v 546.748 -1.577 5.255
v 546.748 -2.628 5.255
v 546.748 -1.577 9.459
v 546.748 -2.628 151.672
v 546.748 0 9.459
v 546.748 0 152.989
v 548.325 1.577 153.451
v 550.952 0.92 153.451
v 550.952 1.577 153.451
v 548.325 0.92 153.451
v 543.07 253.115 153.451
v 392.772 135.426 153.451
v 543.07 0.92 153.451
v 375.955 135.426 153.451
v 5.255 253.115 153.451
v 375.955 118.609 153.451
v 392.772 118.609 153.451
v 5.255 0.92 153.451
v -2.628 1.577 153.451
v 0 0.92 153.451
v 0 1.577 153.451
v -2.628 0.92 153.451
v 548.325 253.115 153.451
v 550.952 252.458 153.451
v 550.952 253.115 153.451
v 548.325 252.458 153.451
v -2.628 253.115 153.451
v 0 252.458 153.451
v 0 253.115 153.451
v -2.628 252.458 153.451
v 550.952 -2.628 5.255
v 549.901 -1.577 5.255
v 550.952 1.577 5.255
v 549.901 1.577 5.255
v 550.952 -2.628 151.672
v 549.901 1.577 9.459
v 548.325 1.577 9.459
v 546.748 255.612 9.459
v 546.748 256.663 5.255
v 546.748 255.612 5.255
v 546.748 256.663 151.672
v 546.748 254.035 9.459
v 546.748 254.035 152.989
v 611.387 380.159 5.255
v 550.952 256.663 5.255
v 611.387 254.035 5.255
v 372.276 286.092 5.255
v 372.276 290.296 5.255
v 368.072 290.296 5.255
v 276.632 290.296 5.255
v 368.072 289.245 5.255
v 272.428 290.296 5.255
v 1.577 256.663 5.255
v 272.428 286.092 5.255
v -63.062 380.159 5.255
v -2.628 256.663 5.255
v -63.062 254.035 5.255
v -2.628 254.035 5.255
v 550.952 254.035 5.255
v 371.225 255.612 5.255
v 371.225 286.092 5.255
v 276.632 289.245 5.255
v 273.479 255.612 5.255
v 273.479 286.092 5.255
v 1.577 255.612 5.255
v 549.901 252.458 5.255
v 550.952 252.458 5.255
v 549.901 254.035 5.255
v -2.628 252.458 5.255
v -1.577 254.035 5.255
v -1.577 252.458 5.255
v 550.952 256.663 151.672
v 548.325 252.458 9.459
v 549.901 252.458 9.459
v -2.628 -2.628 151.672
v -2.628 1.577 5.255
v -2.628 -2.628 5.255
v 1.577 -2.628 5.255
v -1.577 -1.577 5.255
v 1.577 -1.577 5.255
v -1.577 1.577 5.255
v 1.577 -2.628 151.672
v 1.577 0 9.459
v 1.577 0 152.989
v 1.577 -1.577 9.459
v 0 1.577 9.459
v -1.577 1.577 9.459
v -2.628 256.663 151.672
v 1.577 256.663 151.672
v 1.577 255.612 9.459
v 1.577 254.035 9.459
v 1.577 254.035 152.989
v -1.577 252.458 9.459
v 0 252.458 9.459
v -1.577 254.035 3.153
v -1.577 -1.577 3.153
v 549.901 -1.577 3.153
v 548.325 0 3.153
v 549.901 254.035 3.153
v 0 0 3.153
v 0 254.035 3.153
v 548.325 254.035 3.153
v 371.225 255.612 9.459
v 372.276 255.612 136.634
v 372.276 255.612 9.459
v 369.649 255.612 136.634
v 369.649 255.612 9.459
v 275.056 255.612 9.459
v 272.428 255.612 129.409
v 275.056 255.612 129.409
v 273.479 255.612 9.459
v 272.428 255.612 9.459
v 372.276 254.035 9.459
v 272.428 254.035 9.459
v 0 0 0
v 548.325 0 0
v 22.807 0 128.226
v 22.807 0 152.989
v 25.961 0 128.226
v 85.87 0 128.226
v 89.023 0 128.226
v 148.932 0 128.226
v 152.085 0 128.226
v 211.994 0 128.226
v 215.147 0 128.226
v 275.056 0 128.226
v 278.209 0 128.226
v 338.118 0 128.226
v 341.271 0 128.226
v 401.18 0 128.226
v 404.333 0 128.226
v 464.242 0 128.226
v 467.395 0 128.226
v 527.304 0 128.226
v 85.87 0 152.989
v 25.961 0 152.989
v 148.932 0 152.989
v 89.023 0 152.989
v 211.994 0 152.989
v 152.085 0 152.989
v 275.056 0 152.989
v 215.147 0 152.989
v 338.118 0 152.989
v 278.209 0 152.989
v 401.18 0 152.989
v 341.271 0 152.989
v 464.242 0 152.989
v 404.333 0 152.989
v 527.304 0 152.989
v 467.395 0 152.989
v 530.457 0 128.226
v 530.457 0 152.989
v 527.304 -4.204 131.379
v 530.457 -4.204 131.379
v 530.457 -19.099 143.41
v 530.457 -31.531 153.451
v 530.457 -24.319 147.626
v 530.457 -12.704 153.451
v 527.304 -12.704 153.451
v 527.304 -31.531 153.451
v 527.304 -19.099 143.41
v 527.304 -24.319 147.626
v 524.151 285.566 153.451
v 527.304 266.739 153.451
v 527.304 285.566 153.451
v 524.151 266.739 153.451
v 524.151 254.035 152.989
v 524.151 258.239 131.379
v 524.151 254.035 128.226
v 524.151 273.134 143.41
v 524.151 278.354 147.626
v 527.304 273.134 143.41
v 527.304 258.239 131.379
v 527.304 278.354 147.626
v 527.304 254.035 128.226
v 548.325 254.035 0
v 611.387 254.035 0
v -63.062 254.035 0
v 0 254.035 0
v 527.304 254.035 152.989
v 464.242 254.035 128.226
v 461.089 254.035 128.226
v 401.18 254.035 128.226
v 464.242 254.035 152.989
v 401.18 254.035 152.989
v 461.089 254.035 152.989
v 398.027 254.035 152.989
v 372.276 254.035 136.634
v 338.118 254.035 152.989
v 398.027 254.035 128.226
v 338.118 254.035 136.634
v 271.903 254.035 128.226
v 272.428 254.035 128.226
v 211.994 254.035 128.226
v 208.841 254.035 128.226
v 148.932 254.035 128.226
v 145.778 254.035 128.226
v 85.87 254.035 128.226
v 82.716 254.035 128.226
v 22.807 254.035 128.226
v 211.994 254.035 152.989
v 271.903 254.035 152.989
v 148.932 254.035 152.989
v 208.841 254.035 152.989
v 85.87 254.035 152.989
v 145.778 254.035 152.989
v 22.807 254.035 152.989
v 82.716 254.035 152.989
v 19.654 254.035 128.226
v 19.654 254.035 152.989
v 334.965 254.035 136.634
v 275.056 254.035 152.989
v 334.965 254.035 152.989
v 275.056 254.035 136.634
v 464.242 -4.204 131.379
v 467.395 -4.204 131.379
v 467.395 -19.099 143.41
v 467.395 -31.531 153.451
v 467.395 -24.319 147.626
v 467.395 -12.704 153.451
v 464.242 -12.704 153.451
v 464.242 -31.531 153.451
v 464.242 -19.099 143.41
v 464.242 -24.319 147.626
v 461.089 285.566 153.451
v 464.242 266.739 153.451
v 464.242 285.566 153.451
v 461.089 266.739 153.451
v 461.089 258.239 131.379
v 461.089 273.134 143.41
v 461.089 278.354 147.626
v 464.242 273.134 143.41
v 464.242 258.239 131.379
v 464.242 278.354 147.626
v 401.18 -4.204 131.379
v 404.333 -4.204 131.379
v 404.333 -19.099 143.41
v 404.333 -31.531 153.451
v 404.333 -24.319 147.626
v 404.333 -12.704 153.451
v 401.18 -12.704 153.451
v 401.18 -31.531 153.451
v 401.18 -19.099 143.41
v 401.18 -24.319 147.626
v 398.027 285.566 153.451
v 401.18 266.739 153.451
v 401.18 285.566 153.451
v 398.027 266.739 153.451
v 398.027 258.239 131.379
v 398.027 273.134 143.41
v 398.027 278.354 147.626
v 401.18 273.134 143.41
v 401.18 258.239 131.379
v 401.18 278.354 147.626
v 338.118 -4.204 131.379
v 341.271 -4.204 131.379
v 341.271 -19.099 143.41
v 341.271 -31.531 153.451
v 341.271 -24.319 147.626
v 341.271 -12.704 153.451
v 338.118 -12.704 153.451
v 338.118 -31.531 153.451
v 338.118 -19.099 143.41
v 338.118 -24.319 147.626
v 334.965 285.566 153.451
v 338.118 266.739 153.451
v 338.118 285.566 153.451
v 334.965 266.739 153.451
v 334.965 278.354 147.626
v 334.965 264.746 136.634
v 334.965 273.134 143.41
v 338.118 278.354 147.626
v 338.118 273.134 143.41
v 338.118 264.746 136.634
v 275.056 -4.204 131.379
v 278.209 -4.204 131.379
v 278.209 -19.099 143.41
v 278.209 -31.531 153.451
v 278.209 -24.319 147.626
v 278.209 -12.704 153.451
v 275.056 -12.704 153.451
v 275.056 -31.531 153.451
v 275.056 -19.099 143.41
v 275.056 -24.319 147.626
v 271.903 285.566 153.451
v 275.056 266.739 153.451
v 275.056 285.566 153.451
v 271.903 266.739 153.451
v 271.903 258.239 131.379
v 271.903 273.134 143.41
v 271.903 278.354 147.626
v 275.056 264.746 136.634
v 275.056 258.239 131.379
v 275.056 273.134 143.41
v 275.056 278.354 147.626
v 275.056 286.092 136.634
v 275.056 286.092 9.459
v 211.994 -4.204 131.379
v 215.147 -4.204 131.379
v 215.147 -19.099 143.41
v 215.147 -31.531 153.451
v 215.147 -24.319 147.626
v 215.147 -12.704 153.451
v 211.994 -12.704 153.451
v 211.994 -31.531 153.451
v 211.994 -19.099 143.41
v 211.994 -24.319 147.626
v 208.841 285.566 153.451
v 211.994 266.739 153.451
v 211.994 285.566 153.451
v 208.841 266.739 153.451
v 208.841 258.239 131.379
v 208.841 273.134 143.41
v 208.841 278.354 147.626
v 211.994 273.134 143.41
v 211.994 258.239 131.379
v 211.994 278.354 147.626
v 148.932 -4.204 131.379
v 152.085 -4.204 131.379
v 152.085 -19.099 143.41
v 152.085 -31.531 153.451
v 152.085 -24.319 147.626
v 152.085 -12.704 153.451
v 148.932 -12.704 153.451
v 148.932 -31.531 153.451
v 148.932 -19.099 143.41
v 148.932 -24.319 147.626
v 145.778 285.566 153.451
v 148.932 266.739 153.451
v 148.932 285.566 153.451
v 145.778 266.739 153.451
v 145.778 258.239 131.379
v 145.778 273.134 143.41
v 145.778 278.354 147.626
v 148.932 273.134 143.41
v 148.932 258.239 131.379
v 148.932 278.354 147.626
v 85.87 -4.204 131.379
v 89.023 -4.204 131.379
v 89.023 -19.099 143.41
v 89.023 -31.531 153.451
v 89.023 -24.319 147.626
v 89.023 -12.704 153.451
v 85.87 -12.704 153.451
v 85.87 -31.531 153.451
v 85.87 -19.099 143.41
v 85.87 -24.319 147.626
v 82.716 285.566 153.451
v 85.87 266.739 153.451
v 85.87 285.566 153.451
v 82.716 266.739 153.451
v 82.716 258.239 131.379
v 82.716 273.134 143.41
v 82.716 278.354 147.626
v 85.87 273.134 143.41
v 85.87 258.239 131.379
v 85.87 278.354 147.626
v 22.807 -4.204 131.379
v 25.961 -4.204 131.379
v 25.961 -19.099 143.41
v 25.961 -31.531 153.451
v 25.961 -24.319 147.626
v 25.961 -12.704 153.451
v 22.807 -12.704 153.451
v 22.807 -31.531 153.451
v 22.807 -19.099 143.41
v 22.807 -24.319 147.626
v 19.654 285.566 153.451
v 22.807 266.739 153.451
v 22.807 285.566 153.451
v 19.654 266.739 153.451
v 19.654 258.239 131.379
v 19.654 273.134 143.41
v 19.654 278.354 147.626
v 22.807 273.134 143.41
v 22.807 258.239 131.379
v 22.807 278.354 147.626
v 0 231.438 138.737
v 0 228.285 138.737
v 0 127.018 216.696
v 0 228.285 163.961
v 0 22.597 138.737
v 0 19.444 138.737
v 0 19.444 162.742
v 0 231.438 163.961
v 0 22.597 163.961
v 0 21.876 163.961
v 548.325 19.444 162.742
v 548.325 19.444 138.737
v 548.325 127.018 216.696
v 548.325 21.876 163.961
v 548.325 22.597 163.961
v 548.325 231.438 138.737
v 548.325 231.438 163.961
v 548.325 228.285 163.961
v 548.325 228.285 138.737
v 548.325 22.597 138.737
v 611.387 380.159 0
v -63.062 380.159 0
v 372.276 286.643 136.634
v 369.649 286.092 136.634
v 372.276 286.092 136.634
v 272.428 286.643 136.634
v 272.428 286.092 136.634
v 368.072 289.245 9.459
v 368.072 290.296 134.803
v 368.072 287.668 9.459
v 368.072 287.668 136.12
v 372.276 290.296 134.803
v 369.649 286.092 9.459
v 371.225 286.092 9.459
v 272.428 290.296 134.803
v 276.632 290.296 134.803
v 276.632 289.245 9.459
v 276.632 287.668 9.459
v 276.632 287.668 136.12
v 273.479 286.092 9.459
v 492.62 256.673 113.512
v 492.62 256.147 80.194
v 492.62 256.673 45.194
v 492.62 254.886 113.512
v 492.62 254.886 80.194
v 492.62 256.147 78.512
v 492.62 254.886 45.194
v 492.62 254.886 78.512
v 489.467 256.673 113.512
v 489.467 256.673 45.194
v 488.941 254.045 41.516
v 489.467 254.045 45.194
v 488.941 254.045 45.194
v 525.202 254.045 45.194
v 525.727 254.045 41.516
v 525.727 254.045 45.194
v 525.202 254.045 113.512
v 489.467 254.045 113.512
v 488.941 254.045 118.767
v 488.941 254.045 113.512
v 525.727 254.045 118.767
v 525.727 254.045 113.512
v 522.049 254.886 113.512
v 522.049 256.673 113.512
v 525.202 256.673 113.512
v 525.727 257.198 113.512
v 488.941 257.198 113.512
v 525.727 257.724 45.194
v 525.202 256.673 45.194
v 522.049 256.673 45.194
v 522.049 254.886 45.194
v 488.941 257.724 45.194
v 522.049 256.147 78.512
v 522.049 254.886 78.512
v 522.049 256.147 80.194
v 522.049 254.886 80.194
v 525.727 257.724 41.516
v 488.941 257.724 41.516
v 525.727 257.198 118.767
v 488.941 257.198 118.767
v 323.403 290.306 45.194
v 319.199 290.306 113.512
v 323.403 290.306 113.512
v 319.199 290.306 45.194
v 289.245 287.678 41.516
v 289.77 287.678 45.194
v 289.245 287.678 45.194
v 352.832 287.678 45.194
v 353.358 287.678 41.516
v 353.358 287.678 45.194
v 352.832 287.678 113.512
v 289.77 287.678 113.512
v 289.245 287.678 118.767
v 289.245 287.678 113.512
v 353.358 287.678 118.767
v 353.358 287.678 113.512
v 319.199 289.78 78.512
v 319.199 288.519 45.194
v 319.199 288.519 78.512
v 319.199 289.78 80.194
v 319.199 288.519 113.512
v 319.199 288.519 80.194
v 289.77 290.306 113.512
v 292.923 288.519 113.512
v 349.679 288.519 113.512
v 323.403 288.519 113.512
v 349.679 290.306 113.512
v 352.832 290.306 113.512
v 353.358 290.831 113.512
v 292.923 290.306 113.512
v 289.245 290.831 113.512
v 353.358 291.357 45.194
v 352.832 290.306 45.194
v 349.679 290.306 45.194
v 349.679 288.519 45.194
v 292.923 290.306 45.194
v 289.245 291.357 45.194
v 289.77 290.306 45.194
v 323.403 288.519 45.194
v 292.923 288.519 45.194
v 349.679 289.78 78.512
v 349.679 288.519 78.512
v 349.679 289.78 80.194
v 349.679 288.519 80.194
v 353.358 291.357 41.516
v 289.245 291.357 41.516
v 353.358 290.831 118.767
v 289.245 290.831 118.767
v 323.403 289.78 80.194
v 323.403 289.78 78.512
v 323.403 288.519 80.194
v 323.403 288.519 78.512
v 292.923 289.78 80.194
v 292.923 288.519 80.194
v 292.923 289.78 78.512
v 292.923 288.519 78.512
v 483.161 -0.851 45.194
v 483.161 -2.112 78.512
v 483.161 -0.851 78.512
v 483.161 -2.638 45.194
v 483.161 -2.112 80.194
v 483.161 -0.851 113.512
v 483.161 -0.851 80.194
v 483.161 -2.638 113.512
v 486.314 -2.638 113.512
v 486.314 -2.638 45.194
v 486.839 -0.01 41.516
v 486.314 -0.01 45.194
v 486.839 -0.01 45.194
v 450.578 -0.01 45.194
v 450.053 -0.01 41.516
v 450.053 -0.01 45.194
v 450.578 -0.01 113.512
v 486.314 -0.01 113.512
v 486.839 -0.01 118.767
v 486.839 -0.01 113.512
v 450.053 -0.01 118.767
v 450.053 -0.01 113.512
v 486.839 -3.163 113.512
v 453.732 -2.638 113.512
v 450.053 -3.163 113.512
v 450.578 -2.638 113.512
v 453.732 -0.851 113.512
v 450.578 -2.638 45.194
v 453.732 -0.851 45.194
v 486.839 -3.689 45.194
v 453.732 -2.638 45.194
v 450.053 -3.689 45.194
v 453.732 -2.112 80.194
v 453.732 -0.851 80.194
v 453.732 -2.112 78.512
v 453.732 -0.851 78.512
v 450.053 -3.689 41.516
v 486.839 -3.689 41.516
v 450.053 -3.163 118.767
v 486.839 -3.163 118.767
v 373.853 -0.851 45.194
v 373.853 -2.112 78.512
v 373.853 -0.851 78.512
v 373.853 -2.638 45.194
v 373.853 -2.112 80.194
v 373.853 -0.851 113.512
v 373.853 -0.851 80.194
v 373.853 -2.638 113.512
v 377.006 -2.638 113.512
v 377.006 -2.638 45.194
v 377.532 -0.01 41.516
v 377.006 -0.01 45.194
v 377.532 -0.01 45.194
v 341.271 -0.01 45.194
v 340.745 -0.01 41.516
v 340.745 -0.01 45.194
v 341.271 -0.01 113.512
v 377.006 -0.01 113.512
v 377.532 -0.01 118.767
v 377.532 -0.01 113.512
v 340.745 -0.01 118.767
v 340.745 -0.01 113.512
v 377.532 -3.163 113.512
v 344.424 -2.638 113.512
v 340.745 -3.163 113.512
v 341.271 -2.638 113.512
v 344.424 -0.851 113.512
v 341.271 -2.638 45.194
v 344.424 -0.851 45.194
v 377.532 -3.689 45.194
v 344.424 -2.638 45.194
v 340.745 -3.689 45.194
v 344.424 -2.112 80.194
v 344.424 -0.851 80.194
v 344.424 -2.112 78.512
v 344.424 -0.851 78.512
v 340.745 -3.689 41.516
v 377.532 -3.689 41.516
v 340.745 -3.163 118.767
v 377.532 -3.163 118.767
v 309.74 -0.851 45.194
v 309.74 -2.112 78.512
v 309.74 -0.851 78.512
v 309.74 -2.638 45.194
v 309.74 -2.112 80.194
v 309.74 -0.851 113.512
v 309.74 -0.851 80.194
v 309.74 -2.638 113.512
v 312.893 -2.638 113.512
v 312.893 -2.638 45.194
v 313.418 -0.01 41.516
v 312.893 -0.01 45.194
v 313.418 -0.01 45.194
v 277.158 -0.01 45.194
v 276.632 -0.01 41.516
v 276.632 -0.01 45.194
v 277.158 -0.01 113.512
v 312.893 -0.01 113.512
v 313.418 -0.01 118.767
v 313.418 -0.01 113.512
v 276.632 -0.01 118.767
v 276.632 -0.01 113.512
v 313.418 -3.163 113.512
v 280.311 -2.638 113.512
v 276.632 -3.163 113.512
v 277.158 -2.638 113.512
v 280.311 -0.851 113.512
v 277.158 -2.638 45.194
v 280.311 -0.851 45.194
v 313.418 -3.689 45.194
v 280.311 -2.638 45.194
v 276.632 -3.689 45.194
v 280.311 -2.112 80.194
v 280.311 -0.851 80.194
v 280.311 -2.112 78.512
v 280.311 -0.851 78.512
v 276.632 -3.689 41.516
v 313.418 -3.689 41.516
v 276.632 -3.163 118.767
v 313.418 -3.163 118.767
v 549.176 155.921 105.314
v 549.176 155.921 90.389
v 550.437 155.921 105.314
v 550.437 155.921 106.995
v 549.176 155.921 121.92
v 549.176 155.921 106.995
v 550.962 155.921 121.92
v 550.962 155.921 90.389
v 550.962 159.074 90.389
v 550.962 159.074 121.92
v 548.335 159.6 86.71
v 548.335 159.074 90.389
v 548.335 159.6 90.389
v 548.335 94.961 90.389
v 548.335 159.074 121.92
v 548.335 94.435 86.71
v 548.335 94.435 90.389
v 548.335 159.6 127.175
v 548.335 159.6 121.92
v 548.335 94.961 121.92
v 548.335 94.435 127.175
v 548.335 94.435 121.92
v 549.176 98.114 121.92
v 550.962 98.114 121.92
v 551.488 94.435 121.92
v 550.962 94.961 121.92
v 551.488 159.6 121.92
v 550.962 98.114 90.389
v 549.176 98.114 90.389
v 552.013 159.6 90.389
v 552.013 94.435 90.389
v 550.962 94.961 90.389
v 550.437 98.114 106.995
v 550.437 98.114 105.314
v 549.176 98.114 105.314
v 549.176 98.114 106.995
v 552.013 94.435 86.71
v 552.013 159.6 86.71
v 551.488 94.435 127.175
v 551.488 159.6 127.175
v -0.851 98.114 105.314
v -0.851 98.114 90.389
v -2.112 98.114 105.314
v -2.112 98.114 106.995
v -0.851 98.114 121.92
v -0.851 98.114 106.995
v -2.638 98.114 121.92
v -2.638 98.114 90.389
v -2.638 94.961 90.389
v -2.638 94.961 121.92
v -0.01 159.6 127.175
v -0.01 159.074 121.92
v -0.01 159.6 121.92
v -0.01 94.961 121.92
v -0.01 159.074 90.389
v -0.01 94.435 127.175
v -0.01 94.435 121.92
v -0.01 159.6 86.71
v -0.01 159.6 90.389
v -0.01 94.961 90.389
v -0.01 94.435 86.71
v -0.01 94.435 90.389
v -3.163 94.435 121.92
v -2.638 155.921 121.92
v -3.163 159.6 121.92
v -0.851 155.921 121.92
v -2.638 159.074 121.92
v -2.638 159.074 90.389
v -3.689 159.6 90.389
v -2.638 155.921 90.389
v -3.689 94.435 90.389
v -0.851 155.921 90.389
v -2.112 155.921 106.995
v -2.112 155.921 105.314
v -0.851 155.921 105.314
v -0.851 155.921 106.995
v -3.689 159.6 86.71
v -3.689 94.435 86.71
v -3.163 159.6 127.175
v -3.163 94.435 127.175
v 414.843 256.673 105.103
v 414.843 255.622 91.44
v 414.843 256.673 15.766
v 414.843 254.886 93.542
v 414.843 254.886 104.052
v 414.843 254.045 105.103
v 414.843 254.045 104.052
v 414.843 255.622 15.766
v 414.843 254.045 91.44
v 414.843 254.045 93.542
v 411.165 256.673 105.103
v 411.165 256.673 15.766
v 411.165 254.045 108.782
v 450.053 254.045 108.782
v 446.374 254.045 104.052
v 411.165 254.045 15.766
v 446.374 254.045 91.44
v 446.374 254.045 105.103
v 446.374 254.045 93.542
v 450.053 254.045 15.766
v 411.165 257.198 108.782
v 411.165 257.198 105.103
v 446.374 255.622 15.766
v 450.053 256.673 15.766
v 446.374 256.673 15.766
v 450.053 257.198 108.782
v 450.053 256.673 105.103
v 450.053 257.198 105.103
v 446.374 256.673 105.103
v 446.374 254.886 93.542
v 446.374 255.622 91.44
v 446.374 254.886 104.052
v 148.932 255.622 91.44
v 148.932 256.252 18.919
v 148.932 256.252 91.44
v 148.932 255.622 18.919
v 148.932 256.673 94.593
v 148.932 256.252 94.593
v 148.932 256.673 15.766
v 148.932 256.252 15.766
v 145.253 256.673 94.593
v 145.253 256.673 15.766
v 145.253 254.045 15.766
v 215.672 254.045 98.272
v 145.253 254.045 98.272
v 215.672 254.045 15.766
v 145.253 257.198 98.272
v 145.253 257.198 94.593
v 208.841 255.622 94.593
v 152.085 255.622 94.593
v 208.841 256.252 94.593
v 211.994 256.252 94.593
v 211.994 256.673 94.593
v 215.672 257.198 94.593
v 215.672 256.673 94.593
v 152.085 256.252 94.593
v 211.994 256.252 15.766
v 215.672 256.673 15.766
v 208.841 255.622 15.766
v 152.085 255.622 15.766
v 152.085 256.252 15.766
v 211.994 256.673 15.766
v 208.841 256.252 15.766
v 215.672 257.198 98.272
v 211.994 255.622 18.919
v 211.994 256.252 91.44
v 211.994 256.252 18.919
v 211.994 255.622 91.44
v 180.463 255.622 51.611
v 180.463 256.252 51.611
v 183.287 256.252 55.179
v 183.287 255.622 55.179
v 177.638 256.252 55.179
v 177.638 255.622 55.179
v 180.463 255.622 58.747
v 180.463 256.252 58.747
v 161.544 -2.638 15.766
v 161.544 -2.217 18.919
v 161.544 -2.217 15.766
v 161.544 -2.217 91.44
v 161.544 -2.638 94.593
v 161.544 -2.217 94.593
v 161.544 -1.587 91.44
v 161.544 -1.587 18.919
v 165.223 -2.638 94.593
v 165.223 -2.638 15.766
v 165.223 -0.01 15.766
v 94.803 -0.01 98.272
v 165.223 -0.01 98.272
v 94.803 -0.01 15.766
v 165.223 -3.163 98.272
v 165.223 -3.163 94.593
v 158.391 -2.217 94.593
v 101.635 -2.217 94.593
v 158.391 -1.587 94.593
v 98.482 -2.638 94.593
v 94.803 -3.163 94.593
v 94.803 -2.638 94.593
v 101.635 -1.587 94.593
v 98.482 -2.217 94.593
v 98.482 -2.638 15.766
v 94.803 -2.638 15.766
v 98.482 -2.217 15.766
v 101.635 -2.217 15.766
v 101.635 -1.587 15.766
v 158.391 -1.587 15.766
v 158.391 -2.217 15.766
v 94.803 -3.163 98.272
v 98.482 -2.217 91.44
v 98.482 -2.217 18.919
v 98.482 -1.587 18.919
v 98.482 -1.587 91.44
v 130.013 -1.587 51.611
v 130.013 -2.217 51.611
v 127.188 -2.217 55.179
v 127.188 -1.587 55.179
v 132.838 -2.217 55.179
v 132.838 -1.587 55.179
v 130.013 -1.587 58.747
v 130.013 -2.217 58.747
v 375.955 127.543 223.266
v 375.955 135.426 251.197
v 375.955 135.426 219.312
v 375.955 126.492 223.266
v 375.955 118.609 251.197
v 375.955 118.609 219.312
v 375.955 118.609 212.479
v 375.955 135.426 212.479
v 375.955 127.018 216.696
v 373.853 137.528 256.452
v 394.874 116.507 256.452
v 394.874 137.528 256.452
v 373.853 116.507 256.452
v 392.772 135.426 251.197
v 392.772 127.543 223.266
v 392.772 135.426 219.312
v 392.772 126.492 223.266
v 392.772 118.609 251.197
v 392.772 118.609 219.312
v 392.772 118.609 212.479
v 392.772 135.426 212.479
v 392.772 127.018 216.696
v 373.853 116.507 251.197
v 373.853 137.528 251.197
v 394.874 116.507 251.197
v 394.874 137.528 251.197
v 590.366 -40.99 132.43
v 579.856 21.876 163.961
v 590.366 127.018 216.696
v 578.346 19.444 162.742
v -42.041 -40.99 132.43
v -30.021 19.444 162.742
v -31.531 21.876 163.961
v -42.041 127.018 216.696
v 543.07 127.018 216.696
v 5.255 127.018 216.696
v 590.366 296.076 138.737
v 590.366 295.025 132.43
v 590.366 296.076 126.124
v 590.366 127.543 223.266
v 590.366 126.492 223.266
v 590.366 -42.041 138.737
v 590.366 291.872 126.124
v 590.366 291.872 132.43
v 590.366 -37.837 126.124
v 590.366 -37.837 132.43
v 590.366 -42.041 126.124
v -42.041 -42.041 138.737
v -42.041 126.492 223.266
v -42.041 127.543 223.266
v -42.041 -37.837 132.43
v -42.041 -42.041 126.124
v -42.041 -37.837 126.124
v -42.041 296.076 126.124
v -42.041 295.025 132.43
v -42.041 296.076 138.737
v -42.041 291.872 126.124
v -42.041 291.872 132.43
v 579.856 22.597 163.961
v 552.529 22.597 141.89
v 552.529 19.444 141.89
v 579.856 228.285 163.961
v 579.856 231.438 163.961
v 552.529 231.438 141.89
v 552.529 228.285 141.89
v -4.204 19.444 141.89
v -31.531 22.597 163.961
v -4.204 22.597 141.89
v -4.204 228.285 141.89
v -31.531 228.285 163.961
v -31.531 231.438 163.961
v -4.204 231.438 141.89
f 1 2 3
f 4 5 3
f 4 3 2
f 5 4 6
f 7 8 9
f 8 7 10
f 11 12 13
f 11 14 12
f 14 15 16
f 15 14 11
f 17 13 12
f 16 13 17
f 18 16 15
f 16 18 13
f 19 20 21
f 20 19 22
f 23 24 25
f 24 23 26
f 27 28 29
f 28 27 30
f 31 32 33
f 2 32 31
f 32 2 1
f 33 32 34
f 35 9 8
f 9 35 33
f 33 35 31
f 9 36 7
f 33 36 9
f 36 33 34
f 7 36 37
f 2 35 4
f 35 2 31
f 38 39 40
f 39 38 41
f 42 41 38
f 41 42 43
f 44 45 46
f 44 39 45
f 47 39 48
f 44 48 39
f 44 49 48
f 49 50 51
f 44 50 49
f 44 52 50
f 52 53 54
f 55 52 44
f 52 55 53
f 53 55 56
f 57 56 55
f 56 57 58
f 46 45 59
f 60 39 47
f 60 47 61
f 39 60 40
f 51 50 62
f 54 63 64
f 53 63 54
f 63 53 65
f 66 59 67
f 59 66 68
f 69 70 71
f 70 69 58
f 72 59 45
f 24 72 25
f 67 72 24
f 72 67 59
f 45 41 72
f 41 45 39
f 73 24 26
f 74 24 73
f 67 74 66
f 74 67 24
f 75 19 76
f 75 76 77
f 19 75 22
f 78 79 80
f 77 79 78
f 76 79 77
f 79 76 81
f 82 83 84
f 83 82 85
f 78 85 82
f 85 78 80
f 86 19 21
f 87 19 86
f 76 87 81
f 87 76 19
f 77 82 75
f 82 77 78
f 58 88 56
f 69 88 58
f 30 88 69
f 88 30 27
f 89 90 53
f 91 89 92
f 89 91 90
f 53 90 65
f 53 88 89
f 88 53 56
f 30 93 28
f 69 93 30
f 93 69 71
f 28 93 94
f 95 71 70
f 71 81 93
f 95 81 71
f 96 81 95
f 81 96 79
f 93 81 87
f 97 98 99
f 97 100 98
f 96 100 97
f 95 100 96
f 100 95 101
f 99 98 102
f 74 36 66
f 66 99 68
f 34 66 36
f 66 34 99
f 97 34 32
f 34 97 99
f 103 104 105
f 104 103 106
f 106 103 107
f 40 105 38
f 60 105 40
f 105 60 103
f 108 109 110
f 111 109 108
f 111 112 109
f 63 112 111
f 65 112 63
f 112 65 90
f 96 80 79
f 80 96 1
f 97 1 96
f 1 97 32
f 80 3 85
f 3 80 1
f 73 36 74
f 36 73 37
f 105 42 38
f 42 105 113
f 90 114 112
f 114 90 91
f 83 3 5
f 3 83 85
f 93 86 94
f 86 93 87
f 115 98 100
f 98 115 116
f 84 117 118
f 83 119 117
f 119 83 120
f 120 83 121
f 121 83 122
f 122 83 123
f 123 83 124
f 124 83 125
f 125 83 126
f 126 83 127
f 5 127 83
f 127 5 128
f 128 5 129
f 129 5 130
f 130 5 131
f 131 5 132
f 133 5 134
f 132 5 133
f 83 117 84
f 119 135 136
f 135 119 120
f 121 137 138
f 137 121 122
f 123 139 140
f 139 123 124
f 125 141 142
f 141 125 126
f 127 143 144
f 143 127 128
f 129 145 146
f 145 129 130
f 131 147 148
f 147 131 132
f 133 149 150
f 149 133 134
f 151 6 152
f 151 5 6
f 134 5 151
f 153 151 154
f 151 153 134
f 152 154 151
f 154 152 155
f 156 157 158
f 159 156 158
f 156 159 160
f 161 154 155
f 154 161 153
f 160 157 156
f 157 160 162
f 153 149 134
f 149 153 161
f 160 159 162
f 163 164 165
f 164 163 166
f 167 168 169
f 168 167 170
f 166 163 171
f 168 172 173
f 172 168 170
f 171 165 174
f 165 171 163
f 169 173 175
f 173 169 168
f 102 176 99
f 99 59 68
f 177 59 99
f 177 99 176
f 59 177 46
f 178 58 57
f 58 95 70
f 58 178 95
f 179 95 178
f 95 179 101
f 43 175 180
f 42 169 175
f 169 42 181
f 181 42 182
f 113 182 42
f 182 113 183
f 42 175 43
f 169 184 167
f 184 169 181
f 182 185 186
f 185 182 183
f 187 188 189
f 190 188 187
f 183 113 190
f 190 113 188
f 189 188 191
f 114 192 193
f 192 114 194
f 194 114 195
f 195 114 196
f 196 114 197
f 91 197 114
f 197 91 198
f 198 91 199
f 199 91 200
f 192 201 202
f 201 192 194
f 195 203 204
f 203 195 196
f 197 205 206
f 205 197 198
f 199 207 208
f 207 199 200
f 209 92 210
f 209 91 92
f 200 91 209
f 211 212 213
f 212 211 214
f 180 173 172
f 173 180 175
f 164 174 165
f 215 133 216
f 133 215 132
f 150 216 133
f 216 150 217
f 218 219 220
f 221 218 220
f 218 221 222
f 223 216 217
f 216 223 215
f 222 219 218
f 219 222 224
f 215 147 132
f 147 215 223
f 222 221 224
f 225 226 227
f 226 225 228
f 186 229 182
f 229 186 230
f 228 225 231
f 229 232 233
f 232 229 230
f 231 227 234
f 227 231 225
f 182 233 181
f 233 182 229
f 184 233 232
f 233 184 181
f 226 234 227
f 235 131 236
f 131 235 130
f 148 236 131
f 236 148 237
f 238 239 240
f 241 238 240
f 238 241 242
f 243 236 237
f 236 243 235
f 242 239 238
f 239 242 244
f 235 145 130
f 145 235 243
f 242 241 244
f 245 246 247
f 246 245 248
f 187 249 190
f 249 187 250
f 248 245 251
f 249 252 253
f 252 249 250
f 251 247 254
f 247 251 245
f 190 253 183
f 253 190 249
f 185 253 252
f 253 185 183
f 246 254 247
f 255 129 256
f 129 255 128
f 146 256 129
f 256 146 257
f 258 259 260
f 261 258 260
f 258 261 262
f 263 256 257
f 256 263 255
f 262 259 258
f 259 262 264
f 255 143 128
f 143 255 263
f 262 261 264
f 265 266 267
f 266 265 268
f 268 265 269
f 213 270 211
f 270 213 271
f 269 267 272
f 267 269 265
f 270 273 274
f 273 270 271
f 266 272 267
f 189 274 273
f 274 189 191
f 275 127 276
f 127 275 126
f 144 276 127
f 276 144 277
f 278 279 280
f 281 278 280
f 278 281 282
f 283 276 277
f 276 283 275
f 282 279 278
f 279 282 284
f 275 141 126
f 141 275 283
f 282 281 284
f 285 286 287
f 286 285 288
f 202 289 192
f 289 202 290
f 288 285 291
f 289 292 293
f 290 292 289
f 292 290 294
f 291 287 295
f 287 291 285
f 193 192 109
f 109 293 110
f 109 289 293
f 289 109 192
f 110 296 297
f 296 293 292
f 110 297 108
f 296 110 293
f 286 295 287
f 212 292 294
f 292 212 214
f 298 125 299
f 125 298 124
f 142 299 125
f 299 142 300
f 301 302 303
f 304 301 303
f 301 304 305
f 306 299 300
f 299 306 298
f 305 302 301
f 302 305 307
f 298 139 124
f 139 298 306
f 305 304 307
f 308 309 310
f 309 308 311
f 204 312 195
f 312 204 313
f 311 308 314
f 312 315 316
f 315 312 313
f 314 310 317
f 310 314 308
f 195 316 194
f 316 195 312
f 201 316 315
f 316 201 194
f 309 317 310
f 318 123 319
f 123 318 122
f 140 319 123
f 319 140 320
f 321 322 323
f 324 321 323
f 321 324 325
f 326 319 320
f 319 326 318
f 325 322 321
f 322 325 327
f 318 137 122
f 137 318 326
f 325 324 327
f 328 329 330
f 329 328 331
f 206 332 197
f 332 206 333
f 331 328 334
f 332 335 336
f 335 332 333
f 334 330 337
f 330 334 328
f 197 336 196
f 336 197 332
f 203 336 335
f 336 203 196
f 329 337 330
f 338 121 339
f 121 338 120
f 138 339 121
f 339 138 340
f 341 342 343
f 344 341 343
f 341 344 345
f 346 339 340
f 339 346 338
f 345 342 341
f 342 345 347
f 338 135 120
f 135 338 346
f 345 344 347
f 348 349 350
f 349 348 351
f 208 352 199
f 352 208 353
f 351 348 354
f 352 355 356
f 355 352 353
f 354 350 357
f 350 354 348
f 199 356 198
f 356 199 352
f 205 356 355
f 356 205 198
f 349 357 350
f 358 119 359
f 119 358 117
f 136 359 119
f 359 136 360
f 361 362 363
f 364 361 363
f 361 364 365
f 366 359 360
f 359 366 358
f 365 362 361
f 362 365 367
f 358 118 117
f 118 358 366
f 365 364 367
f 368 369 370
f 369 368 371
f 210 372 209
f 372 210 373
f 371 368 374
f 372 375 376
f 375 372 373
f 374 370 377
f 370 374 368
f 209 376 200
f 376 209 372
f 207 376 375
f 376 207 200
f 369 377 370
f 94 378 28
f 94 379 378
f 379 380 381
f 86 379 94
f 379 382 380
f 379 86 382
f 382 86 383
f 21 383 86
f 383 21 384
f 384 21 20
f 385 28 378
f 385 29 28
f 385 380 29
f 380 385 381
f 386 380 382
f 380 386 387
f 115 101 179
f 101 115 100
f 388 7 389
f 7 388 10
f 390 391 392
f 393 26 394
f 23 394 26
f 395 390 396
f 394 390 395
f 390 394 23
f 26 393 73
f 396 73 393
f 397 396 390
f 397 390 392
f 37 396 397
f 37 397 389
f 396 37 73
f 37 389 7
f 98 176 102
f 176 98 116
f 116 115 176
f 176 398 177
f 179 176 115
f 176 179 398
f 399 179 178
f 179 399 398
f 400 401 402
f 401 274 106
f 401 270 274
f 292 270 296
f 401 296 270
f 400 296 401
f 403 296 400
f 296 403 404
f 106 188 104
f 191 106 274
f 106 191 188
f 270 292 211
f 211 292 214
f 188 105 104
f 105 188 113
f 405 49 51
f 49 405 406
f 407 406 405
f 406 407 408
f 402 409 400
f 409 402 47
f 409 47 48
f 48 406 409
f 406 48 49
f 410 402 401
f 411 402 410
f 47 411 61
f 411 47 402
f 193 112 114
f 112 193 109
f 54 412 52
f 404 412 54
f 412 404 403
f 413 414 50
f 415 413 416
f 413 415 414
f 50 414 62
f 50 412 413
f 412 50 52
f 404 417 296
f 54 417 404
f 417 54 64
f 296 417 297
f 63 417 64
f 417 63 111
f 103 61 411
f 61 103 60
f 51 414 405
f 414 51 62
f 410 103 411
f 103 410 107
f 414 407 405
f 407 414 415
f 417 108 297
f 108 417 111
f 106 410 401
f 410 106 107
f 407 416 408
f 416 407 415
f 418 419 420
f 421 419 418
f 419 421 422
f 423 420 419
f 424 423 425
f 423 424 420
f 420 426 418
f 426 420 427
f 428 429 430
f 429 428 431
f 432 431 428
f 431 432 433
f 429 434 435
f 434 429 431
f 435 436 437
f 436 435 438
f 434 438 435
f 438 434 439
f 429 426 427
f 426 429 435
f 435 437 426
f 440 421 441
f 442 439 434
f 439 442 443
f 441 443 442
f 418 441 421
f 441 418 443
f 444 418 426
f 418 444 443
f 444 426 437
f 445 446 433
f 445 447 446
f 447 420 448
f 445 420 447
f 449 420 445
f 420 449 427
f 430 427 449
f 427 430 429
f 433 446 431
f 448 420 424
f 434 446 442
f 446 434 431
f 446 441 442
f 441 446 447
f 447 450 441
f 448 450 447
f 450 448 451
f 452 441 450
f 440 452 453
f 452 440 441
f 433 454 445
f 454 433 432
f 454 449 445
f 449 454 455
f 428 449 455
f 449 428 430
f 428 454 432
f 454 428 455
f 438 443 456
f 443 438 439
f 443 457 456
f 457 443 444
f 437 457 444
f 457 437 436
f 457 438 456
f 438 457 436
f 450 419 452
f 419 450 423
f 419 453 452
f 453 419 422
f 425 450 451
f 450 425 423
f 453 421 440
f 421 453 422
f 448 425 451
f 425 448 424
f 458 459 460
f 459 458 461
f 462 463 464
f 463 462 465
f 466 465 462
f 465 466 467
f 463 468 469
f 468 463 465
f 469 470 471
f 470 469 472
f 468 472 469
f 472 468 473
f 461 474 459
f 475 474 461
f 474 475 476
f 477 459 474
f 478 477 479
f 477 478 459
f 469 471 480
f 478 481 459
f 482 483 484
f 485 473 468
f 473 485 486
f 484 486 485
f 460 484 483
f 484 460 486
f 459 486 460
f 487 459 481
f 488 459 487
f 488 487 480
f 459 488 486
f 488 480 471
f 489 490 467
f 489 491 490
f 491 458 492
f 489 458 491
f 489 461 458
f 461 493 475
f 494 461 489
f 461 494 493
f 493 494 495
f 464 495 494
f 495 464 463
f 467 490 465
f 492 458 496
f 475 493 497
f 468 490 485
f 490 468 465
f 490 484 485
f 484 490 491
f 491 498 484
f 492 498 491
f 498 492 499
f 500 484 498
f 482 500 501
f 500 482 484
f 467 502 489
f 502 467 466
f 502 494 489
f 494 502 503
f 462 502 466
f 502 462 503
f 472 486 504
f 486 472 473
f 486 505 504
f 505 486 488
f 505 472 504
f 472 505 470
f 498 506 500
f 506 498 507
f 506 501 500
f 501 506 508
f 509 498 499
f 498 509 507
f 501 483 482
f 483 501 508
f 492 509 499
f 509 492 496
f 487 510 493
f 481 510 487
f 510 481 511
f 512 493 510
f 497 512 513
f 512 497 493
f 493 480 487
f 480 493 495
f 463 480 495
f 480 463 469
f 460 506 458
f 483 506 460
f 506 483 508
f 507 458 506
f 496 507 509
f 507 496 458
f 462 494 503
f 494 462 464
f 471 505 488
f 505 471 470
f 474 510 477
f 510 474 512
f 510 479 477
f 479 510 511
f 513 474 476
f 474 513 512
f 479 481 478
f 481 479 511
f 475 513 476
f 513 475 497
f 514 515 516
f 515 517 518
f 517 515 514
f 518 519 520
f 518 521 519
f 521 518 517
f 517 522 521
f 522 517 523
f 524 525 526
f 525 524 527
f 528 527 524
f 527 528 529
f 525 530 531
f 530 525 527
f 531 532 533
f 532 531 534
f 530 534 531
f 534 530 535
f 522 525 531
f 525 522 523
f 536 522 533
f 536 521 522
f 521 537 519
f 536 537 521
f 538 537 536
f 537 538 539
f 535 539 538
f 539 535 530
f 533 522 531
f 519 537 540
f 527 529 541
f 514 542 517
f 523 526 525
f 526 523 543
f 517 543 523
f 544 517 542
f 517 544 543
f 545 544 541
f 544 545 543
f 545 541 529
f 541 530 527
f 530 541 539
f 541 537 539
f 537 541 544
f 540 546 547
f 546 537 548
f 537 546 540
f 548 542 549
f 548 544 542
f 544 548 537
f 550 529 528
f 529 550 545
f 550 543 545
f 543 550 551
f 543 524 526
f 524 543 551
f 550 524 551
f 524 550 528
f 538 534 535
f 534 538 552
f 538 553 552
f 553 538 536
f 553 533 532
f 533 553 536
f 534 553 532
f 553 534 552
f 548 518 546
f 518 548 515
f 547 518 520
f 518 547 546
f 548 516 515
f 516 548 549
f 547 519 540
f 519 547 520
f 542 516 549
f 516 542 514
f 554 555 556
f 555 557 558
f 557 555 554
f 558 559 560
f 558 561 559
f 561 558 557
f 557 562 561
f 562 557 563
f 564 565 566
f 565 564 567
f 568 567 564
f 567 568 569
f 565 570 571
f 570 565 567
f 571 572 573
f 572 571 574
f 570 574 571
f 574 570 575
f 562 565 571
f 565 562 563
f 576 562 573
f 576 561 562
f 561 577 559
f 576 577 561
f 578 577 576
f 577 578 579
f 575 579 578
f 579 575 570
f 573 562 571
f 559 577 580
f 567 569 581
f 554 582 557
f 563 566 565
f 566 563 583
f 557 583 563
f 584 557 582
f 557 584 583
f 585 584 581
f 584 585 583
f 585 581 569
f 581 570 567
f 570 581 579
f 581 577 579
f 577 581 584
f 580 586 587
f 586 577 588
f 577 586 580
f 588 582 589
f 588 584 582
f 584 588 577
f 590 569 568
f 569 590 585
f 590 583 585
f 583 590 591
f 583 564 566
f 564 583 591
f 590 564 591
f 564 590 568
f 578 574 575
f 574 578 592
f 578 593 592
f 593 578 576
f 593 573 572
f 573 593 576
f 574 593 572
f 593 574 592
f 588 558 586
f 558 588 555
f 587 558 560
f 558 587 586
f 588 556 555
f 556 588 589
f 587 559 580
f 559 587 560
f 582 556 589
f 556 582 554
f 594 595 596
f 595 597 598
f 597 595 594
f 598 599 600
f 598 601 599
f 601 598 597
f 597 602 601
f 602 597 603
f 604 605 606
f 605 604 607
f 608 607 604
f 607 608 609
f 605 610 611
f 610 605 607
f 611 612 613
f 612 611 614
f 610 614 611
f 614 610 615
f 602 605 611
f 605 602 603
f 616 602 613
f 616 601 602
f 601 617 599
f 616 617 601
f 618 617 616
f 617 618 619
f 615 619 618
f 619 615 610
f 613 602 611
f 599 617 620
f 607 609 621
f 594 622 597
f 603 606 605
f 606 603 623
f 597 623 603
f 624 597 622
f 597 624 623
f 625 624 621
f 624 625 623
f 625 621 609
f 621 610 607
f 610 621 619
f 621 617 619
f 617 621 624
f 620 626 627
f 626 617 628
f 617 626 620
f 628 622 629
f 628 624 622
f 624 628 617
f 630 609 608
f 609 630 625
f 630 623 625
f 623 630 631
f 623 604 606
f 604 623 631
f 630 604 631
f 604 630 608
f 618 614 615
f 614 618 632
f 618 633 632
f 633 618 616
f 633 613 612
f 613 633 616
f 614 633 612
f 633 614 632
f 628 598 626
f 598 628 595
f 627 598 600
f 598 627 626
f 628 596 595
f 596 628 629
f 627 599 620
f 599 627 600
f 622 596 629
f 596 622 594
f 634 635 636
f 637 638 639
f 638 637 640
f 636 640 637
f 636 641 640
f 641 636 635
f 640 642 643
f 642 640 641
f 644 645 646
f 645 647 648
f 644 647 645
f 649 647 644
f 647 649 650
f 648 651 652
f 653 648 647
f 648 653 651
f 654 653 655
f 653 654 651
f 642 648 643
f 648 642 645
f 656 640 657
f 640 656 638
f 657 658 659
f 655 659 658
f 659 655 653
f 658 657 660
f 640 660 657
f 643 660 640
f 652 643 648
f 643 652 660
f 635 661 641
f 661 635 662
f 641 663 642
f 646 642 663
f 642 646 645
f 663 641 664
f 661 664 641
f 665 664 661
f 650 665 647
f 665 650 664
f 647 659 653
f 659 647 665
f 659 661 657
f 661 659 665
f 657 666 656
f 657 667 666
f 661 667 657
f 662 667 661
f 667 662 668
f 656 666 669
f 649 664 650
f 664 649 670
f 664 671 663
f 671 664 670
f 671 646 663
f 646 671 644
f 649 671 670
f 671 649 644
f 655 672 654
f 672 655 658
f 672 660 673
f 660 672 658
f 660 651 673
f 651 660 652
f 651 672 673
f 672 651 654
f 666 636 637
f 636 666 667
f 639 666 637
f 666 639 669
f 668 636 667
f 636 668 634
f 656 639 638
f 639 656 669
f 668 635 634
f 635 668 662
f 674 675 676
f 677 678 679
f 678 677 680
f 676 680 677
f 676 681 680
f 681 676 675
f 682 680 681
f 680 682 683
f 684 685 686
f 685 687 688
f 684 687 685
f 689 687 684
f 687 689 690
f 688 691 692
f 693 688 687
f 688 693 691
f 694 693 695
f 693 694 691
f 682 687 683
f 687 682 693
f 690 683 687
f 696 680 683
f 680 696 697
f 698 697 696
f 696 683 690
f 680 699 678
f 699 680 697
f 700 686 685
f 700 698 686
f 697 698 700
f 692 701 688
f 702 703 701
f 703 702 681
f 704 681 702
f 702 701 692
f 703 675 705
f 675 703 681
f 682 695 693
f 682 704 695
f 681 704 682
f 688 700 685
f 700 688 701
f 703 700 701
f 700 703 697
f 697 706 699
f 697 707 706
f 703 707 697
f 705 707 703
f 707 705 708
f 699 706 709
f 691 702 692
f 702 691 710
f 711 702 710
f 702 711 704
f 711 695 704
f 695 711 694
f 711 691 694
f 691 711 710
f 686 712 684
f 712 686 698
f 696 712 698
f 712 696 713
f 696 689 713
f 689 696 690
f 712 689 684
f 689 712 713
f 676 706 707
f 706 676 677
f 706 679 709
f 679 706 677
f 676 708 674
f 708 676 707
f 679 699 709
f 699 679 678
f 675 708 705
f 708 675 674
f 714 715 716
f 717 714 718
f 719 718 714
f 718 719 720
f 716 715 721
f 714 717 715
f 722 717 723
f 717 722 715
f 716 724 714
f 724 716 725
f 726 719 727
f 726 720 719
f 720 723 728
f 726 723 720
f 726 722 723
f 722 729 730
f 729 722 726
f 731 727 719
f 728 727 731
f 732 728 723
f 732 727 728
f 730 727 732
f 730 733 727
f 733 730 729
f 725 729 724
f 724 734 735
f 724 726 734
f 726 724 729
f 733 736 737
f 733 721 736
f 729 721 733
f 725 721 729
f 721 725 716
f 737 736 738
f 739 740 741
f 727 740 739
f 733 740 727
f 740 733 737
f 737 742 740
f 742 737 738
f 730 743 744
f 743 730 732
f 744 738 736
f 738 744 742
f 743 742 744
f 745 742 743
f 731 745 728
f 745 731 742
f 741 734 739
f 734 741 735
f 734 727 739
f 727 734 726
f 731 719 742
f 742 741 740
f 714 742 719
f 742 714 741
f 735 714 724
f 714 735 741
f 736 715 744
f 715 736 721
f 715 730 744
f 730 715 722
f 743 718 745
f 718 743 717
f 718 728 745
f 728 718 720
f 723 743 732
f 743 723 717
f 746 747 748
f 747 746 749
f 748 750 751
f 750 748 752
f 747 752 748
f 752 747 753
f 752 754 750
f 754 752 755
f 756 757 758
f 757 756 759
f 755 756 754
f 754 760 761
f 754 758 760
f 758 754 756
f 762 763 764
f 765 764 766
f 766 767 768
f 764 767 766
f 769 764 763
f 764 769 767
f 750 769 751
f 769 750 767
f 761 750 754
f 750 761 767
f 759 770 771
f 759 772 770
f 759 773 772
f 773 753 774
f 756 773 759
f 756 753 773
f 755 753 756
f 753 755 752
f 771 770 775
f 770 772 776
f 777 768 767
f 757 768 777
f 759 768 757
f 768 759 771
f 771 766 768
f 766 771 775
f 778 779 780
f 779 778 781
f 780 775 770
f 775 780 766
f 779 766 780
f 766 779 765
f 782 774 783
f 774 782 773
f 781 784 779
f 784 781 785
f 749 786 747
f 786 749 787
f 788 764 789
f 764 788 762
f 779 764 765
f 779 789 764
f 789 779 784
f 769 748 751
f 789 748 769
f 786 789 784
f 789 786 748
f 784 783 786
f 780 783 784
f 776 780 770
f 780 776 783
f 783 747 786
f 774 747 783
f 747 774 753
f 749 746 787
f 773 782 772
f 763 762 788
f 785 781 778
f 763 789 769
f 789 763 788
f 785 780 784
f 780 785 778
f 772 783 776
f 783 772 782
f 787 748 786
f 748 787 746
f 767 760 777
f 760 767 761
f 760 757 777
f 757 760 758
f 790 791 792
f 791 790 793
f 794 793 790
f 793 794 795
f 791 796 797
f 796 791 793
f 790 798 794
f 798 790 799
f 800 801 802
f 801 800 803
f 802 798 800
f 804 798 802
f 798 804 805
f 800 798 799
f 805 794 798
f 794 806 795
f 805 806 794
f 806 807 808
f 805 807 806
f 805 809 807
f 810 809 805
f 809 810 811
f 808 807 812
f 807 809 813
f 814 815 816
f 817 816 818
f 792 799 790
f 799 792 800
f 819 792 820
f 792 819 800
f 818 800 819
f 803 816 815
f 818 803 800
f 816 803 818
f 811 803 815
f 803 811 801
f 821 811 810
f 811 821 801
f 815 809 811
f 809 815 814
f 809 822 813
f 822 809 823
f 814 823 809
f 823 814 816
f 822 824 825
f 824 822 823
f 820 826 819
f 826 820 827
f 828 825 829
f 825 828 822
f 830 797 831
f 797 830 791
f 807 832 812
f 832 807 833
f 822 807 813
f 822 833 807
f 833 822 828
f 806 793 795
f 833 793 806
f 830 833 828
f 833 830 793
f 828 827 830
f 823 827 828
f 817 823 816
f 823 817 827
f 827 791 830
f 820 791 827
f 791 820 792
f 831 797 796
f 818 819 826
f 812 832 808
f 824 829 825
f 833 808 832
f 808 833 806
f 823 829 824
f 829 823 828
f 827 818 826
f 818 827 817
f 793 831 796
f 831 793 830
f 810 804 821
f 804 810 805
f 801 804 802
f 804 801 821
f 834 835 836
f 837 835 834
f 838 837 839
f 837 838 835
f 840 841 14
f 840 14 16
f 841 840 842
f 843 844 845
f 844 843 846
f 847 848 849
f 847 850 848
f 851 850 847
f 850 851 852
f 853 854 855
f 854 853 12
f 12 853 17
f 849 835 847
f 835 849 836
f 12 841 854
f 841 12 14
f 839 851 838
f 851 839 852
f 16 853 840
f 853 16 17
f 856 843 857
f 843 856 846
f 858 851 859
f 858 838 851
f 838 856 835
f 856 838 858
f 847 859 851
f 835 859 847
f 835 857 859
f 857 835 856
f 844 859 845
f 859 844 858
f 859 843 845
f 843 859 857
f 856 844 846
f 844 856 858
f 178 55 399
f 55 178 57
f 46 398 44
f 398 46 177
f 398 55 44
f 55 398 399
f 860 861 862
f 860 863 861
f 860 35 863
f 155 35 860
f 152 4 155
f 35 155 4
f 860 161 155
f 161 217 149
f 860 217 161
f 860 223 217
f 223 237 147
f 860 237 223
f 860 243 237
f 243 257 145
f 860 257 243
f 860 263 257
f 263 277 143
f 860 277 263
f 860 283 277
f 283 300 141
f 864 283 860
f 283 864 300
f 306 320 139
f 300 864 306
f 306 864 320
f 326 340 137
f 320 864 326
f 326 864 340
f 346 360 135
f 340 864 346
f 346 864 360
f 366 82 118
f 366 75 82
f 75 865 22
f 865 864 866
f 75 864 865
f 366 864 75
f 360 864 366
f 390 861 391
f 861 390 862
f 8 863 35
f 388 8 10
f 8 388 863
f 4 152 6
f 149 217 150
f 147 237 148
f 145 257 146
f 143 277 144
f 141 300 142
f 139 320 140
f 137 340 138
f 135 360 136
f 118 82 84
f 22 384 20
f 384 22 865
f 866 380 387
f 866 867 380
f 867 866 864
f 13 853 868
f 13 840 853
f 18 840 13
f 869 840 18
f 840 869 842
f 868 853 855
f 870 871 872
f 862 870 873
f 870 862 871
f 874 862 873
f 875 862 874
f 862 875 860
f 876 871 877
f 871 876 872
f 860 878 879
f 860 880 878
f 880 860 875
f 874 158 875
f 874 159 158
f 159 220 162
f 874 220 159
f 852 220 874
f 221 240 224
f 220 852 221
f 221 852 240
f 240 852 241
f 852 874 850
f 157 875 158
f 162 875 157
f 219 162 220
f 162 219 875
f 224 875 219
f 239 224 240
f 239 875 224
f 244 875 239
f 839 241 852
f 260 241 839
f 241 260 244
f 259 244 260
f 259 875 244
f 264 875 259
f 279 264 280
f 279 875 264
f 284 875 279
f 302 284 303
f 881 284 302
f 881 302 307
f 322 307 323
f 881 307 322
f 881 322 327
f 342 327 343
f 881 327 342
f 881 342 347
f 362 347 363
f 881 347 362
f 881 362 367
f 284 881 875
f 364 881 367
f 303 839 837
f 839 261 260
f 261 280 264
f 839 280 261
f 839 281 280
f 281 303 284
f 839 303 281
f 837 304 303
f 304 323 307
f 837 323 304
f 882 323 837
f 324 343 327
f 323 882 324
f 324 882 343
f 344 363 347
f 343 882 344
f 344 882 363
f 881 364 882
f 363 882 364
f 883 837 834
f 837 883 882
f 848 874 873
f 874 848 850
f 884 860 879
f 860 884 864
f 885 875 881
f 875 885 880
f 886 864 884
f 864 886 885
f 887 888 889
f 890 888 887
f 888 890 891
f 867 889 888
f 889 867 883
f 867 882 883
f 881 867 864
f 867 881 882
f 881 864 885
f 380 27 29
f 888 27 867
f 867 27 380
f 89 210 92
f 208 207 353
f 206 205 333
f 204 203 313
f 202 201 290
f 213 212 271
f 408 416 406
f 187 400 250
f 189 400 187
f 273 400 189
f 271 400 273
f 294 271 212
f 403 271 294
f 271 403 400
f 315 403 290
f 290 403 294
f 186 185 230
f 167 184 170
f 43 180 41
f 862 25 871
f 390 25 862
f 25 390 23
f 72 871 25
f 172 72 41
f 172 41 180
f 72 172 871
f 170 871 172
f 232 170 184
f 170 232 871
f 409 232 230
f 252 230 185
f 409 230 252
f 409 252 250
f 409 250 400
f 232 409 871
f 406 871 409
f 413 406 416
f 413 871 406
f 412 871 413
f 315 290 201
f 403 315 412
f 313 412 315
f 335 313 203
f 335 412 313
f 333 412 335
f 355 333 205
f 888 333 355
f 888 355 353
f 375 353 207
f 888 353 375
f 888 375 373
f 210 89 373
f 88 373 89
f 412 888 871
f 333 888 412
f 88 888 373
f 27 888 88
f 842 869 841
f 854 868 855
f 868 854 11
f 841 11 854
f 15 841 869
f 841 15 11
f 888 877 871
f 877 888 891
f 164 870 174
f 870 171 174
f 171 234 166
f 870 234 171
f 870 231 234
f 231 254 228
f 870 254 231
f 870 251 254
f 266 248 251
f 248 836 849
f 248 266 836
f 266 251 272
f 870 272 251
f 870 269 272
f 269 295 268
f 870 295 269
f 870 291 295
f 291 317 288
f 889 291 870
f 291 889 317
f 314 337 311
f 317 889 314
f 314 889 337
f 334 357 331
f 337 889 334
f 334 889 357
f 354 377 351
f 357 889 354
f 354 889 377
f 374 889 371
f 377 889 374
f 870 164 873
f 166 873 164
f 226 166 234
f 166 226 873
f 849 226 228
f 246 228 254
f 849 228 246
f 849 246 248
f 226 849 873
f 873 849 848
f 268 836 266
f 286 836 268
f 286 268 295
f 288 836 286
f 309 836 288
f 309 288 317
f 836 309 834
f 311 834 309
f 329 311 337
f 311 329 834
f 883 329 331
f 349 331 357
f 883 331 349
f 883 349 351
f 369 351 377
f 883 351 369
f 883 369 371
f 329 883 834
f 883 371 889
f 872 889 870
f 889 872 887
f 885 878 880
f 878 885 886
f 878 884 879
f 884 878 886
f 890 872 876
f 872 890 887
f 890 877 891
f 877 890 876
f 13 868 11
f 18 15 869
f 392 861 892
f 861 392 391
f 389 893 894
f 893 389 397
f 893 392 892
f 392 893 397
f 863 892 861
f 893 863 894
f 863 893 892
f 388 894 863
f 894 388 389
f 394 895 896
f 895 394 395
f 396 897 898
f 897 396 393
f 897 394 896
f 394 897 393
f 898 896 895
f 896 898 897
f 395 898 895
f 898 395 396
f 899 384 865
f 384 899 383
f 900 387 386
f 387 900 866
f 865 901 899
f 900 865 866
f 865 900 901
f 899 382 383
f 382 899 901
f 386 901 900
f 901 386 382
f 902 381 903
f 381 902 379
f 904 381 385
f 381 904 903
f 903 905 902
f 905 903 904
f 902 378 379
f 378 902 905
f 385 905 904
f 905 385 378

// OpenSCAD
// =====================================================================
//  MILWAUKEE ROAD - WOODMAN, WIS. PASSENGER STATION (built 1914)
//  Source: Album of Depot Plans 1919, sheet 105 (C.M.&St.P. Engineering Dept.,
//  drawn Chicago May 20 1919).  Drawings are private reference (in copyright):
//  Research Library / RSW / Stations / Standard depots / Album of Depot Plans 1919.
//  Rib Side Works, 26 Nov 2026.  HAND-BUILT FIRST SHAPE MODEL - not cut into print
//  sections.  Not in the generator (do not let make_depots.py overwrite it).
//
//  Fate: not known.  No sign on the web that it still stands (checked 26 Nov 2026).
//
//  KNOWN (from the sheet):
//   - 52 ft 2 in x 24 ft 2 in.  From the west end: 17 ft 0 waiting, 9 ft 0 ticket bay,
//     26 ft 2 baggage.  General waiting 14 x 23, smoking 11 ft 4 x 13, ticket office
//     11 ft 4 x 13, baggage and freight 23 x 23 with a 4-ton depot scale.
//   - Square-cornered ticket bay, 9 ft wide, on the track side, paired window.
//   - Gable roof, ridge along the track, shingles, quarter pitch (rise 1/2 per ft).
//   - 6 in drop siding, cement curbing at the base, brackets under the eaves.
//   - Track side: window, passenger door with transom, bay, freight door with transom.
//   - One high 4-light window in each gable end; brick chimney at the office wall.
//   - Ceilings 12 ft (waiting), 14 ft (baggage); baggage floor is cement near grade.
//  ESTIMATE (scaled from the sheet or guessed):
//   - Plate 14.6 ft above grade, eave overhang 4 ft, gable rake overhang 4 ft.
//   - Window and door sizes and positions scaled off the drawing (about +/- 0.5 ft).
//   - Town side is NOT drawn: windows and the freight door placed from the floor plan.
//   - Bay depth 3.2 ft (scaled from the plan); bay wall height.
//   - Platform size.  Colours: RSW default light gray body, dark gray trim (no photo).
//
//  Shared builder ../../../_common/rsw_depot.scad (x along the track, y = 0 town side,
//  track side +y, feet).  SCALE 29 G, 48 O, 87 HO.  Data below is measured from the
//  waiting-room end; the whole model is mirrored so the track side reads like the sheet
//  (waiting room on the left, freight door on the right).  Compass direction not known.
// =====================================================================
SCALE = 29;
include <../../../_common/rsw_depot.scad>
WAIN = -1.0;    // no belt course on the sheet: tuck the builder's belt into the water table

L  = 52.17;     // length
W  = 24.17;     // width
PL = 14.6;      // ESTIMATE plate height
RISE = 0.5;     // quarter pitch
OV = 4;         // ESTIMATE eave overhang
RAKE = 4;       // ESTIMATE gable rake overhang
BAY_D = 3.2;    // ESTIMATE bay depth

// main block draws its own roof below (roof kind 5) so the rake can be wider than the builder's 1 ft
MAIN = [0, L, 0, W, PL, RISE, 5, OV, 0];
BAYB = [17, 9, W, BAY_D, PL - OV * RISE + (OV - BAY_D) * RISE, 0, 5, 0, 0];   // bay walls run up under the eave

translate([ft(L), 0, 0]) mirror([1, 0, 0]) {
depot(blocks = [MAIN, BAYB],
      wins = [
        // track side
        [3.9, 1, 2.8, 6.5, 4.3],
        [20.2, 1, 2.6, 6.5, 4.3, 1], [23.0, 1, 2.6, 6.5, 4.3, 1],     // paired bay window
        // town side (ESTIMATE from the plan)
        [7.6, 0, 2.8, 6.5, 4.3],
        [18.0, 0, 2.8, 6.5, 4.3], [24.1, 0, 2.8, 6.5, 4.3],
        // high window in each gable end (over the benches)
        [W / 2, 2, 5.5, 3.0, 8.6], [W / 2, 3, 5.5, 3.0, 8.6]
      ],
      doors = [
        [11.2, 1, 3.0, 7.2, 0],           // waiting-room door with transom
        [35.0, 1, 6.0, 7.5, 2],           // freight door, track side
        [39.8, 0, 6.0, 7.5, 2]            // freight door, town side (from the plan)
      ],
      chims = [[15.6, W / 2, 24.4]],
      plat = [-6, L + 12, 12, 0.5]);

// gable roof with the wider rake, its fascia, and the gable walls
EAVE = PL - OV * RISE;
paint("roof") roof_solid(-RAKE, L + 2 * RAKE, -OV, W + 2 * OV, EAVE, RISE, 1);
paint("trim") {
    fbox(-RAKE, -OV, EAVE - 0.6, L + 2 * RAKE, 0.4, 0.6);
    fbox(-RAKE, W + OV - 0.4, EAVE - 0.6, L + 2 * RAKE, 0.4, 0.6);
}
gable_ends(0, L, 0, W, PL, RISE, 1, 0);

// brackets under the rake at each gable end (ESTIMATE spacing)
paint("trim") for (x = [0, L], y = [2, W - 2.3])
    translate([ft(x), ft(y), ft(PL - 2.4 + (y < W / 2 ? y : W - y - 0.3) * RISE)])
        rotate([0, 0, x == 0 ? 180 : 0]) rotate([90, 0, 0]) translate([0, 0, -ft(0.15)])
            linear_extrude(ft(0.3)) polygon([[0, 0], [0, ft(2.4)], [ft(RAKE * 0.75), ft(2.4)], [ft(0.4), ft(0.3)]]);
}
